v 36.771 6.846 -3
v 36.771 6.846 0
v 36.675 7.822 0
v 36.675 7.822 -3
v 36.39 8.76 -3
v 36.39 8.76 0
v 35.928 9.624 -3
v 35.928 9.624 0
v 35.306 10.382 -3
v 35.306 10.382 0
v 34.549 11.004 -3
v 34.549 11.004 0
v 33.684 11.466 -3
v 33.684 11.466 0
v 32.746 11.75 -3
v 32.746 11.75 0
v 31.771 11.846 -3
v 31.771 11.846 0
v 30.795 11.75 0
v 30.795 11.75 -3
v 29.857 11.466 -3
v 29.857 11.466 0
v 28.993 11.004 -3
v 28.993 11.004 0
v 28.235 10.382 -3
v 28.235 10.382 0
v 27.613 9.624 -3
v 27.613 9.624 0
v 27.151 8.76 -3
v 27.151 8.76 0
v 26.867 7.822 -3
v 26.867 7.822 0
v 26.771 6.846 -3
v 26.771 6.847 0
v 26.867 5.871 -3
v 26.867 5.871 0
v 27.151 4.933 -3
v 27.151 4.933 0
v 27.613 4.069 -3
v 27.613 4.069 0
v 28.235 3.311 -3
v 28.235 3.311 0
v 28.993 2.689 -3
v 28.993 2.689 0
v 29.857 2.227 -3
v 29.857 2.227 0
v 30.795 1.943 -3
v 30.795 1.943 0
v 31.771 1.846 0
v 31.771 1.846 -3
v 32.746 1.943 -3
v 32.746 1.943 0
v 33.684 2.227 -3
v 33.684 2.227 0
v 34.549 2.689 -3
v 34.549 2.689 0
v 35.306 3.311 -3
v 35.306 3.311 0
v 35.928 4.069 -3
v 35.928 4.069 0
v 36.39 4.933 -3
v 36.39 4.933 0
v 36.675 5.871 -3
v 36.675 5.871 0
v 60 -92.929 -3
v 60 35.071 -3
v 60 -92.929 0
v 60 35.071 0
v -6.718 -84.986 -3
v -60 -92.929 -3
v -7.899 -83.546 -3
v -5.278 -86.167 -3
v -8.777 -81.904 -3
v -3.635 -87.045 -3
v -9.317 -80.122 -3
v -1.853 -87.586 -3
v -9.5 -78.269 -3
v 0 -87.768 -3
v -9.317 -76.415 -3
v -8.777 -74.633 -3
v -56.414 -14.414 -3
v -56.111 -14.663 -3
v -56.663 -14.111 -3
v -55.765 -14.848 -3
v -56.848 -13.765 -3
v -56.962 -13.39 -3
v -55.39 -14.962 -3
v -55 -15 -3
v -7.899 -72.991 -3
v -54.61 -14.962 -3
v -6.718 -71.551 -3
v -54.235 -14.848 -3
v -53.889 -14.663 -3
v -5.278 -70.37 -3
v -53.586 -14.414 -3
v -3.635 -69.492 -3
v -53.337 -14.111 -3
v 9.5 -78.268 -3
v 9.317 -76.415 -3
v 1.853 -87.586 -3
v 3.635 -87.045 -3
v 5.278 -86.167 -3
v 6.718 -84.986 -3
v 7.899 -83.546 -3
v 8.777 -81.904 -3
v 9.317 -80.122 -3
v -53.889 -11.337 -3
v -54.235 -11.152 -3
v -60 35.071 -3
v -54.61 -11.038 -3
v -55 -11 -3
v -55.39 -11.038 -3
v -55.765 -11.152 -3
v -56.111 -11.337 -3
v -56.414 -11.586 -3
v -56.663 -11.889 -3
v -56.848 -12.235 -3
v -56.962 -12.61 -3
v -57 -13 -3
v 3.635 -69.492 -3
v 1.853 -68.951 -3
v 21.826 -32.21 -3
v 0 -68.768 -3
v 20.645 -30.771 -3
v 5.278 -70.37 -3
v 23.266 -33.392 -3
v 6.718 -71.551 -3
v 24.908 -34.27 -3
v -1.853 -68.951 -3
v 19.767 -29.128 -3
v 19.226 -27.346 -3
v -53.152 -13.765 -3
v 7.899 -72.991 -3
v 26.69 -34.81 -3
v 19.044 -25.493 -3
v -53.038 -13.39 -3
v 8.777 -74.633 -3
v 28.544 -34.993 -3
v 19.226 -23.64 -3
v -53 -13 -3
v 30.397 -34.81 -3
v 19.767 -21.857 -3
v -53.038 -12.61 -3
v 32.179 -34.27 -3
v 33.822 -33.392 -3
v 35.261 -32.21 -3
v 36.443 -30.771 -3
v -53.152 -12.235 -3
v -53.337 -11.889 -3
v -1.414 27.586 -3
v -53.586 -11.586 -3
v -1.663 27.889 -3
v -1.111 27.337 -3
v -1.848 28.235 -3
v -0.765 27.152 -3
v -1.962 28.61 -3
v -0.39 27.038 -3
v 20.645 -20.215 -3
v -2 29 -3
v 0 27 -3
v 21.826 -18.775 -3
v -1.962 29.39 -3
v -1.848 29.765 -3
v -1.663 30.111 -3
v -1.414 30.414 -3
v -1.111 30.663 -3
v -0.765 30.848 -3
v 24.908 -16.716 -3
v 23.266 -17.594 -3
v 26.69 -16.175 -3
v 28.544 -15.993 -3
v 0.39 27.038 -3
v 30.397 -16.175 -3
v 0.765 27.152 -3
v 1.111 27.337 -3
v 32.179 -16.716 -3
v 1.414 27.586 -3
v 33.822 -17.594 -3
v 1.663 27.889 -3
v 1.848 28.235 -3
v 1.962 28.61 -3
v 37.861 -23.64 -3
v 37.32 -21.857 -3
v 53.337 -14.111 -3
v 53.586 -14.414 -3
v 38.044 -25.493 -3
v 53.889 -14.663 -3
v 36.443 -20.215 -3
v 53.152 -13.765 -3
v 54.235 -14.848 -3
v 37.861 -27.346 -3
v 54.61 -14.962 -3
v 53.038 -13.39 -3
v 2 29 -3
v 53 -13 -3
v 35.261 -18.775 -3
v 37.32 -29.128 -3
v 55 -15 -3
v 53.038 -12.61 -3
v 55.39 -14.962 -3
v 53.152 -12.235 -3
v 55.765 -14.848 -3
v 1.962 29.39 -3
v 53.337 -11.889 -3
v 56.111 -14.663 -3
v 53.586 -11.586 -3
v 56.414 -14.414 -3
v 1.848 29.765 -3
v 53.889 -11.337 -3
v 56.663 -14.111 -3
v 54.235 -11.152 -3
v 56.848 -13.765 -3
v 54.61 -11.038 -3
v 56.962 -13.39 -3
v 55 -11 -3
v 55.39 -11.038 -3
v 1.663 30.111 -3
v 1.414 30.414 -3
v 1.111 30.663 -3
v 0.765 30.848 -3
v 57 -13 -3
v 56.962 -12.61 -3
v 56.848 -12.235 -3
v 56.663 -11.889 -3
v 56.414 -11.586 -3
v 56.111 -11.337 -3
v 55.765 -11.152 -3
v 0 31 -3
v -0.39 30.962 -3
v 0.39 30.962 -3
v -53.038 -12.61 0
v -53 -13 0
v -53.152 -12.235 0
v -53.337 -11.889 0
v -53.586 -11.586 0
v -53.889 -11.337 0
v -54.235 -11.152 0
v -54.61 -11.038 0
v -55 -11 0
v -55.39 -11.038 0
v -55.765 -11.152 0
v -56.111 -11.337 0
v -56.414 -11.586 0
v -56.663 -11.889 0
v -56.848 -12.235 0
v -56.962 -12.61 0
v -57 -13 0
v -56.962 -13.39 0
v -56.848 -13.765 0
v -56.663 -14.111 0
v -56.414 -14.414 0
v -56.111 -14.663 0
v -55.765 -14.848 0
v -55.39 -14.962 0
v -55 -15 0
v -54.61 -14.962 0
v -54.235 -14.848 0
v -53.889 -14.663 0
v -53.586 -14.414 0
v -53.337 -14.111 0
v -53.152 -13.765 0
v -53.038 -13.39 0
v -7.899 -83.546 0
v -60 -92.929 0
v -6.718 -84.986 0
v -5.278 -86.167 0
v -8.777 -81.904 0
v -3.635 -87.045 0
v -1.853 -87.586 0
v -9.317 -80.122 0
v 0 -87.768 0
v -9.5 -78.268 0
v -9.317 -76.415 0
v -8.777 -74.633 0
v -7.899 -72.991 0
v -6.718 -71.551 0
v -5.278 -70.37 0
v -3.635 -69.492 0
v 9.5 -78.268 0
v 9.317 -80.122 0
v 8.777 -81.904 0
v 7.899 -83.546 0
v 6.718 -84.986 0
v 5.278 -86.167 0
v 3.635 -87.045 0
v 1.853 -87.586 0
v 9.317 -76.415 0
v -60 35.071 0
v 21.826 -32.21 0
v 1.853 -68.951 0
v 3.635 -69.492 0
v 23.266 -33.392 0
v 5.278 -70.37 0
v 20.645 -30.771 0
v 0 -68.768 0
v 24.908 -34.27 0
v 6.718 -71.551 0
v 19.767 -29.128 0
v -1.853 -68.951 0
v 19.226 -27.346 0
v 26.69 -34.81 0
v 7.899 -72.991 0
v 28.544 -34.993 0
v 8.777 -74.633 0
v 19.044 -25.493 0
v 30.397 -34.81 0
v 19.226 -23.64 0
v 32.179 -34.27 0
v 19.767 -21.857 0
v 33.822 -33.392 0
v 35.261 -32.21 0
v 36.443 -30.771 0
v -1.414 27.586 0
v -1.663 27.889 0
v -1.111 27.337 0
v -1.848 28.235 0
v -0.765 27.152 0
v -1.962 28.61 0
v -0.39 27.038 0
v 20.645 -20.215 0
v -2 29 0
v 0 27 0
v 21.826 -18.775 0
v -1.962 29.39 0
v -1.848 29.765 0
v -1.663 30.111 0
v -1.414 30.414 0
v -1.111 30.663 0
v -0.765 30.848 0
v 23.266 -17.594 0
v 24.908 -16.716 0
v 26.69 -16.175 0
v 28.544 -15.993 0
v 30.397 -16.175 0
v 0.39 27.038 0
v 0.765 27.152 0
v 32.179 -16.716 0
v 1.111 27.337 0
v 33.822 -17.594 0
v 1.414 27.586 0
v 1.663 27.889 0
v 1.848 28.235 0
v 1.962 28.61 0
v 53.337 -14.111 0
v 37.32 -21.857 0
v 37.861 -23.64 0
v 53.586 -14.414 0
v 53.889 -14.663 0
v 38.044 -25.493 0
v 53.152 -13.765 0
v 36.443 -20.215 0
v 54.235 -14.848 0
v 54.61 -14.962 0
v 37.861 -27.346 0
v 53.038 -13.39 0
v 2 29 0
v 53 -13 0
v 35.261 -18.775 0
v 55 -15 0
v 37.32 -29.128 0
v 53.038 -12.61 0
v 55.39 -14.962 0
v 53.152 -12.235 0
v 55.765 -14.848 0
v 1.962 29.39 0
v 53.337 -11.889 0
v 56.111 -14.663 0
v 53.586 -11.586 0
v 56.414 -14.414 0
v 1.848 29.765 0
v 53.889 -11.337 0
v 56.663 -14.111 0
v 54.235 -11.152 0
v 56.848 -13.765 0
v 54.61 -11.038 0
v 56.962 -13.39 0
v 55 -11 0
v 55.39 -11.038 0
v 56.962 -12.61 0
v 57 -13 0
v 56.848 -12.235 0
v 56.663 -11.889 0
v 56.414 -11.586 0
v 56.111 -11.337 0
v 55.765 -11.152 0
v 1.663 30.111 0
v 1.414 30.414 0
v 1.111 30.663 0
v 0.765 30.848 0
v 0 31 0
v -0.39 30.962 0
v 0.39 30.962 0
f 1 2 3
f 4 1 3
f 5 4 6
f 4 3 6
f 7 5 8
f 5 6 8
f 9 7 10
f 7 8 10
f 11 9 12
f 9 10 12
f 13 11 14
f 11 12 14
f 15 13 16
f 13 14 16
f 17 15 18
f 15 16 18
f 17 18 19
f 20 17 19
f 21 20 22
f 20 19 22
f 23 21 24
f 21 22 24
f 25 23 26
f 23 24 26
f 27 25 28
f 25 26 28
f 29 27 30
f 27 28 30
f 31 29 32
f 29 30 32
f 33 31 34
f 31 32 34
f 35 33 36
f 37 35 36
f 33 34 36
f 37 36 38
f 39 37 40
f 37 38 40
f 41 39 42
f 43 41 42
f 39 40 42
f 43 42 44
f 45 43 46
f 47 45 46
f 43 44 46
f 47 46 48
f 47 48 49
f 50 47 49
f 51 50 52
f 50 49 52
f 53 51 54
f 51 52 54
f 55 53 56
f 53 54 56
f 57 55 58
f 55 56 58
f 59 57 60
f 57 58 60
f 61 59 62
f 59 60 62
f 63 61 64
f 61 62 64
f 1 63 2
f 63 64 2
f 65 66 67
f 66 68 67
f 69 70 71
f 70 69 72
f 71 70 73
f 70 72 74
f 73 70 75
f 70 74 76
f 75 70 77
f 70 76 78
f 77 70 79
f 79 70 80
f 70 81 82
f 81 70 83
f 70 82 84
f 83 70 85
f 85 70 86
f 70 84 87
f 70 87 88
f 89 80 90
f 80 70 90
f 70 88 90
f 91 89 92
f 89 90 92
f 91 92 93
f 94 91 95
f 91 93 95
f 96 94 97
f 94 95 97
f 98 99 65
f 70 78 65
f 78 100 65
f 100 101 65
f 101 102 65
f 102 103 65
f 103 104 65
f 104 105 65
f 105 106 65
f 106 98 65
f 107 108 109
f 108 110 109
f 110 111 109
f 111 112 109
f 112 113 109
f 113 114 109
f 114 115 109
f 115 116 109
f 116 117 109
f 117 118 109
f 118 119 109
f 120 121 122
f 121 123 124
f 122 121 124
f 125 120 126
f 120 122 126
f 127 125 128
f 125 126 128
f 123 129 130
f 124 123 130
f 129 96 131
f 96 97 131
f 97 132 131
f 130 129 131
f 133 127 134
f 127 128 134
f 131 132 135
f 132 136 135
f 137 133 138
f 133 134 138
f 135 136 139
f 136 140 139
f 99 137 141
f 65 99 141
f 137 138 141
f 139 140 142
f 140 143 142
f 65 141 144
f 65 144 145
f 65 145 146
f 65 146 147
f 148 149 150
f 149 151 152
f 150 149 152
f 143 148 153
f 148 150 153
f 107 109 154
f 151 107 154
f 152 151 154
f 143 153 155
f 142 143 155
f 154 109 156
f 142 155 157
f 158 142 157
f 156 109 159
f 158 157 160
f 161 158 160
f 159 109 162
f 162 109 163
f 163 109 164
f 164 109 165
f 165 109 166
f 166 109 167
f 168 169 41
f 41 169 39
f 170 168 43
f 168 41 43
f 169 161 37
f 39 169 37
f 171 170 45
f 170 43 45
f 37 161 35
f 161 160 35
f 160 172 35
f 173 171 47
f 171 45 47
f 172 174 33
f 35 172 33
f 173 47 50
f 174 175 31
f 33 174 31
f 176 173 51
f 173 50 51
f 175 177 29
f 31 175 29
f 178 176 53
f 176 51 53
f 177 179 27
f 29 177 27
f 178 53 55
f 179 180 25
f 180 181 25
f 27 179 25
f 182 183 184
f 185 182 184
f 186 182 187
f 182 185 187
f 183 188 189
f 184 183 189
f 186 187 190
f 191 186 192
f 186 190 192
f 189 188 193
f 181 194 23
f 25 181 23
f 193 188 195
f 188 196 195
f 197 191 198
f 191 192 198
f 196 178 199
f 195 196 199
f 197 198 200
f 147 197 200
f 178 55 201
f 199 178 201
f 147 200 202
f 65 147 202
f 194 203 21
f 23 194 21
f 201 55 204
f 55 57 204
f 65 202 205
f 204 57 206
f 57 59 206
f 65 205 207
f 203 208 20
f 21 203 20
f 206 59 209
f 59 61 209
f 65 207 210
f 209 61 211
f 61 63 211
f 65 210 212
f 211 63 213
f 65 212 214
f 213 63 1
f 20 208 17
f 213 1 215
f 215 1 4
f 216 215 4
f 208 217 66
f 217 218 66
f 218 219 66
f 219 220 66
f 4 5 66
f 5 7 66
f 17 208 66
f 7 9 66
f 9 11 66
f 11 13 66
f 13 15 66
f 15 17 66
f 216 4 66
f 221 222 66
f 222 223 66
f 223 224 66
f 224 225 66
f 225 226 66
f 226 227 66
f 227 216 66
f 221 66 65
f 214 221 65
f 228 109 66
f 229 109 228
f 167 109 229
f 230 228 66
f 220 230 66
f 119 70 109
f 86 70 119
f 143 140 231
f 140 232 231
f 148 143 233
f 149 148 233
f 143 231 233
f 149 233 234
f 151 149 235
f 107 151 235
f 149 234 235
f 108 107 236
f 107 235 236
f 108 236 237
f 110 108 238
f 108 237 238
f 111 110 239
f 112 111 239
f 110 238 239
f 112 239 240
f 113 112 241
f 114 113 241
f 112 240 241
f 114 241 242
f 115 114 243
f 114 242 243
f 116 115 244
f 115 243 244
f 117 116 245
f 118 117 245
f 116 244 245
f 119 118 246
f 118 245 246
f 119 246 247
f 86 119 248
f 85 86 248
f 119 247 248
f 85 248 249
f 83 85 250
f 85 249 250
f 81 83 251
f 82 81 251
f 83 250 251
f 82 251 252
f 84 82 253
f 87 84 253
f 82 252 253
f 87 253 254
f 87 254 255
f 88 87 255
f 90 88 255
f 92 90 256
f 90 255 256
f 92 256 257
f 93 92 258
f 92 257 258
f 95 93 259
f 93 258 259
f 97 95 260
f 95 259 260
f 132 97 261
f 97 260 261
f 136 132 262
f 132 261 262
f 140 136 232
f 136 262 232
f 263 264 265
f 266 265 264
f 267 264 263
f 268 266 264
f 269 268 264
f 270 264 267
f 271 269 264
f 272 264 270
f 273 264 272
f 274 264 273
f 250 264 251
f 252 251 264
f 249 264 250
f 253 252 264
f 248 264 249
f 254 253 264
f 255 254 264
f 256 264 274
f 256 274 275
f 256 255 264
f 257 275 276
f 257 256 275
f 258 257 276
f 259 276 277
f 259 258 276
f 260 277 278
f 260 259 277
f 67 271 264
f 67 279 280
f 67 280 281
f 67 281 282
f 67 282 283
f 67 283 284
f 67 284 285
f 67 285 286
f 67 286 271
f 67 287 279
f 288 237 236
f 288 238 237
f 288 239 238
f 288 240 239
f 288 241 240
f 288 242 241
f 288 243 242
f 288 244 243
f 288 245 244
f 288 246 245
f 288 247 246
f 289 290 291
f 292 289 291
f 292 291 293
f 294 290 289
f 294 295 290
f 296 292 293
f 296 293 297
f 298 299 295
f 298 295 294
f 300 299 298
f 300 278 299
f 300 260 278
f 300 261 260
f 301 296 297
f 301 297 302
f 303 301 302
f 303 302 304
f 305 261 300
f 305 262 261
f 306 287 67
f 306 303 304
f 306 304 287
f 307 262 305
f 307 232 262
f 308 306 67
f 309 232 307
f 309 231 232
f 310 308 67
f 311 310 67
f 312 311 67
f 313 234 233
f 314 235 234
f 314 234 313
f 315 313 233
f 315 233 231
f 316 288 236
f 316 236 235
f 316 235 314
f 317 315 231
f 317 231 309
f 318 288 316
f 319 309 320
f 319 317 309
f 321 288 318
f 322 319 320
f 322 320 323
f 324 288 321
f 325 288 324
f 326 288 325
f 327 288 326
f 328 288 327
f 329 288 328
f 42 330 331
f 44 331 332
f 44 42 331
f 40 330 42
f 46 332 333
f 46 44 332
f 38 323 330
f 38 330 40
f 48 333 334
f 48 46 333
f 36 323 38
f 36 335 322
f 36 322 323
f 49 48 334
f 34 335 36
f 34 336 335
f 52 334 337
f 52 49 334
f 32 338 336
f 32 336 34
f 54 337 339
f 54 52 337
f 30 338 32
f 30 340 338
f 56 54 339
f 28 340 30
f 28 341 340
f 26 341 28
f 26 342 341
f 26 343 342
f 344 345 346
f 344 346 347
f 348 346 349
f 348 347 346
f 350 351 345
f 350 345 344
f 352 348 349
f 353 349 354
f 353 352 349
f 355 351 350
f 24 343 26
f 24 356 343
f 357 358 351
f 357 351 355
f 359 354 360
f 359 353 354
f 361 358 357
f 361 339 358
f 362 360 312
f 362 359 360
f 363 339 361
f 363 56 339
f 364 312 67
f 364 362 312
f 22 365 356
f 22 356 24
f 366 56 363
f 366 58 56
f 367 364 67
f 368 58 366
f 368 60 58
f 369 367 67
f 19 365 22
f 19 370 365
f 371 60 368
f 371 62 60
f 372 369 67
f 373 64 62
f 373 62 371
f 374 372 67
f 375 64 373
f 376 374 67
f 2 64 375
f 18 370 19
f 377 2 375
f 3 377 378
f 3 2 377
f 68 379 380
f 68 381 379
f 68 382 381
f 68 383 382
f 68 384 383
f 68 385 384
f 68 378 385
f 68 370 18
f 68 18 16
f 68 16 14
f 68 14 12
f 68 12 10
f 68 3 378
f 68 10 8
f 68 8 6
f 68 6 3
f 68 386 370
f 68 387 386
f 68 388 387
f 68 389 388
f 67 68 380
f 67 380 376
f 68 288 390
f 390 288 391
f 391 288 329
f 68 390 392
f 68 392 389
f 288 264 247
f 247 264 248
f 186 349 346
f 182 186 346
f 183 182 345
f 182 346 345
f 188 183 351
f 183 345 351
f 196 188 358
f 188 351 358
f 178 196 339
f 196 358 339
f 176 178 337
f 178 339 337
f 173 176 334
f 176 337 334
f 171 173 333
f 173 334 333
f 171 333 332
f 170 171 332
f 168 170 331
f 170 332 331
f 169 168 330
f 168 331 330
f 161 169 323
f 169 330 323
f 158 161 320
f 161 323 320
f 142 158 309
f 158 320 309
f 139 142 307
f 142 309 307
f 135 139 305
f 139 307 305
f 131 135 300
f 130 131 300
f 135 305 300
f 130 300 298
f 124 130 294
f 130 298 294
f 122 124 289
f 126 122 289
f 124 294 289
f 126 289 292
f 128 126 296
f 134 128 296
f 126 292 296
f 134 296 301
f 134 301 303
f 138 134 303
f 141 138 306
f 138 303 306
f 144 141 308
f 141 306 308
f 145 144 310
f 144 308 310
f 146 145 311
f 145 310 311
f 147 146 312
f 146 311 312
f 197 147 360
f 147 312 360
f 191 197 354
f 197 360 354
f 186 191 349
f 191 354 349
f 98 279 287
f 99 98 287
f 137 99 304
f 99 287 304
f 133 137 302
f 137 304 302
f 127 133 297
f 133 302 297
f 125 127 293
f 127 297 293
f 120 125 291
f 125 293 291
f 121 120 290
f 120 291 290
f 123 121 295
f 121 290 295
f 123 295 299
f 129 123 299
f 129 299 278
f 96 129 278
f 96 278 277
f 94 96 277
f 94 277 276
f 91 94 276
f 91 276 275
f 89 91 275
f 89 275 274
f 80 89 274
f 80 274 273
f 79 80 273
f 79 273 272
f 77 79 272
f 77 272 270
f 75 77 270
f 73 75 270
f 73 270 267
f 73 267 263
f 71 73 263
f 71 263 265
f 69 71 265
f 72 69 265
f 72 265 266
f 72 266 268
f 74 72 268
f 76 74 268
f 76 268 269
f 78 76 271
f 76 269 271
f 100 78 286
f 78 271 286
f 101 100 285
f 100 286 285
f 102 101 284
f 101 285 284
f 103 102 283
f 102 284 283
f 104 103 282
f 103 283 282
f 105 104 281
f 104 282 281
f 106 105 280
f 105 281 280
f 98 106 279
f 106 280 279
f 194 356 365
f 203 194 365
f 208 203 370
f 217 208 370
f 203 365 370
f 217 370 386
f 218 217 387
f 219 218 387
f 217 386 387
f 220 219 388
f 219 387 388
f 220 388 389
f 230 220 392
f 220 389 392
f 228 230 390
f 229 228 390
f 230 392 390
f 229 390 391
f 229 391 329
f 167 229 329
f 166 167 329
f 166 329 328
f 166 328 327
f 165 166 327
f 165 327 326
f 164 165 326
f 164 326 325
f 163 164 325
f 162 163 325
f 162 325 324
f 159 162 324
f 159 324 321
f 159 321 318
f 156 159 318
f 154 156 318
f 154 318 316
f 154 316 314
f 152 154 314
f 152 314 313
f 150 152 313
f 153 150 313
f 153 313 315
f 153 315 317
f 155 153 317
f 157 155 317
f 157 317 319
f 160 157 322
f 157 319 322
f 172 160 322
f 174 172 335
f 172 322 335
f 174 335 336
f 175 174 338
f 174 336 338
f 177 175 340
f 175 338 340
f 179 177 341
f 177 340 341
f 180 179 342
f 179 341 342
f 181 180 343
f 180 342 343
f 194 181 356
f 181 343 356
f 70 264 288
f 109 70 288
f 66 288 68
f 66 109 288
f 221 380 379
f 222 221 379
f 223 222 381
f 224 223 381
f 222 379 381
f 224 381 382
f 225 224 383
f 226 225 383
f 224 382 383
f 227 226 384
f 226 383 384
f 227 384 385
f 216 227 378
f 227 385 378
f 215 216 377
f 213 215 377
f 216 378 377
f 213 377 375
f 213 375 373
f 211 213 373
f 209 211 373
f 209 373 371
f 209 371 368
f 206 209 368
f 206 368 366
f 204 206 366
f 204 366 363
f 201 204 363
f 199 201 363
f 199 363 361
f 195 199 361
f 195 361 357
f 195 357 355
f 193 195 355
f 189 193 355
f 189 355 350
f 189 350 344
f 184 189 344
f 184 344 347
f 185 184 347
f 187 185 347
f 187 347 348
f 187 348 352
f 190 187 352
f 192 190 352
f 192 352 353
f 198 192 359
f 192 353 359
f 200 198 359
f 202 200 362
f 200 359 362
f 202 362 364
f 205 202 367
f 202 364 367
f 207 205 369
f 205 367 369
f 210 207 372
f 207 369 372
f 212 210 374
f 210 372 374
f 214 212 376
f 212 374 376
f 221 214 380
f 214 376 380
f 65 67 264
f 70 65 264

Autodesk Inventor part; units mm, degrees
ref_plane "YZ Plane" through (0, 0, 0) normal (1, 0, 0) x (0, 1, 0)
ref_plane "XZ Plane" through (0, 0, 0) normal (0, 1, 0) x (-1, 0, 0)
ref_plane "XY Plane" through (0, 0, 0) normal (0, 0, 1) x (1, 0, 0)
sketch "スケッチ3" plane through (0, 0, 0) normal (0, 0, 1) x (1, 0, 0)
  line L0 (60, -99.3436) -> (-60, -99.3436)
  line L1 (-60, -99.3436) -> (-60, 99.3436)
  line L2 (-60, 99.3436) -> (60, 99.3436)
  line L3 (60, 99.3436) -> (60, -99.3436)
  line L4 (60, -99.3436) -> (-60, 99.3436) construction
  line L5 (-60, -99.3436) -> (60, 99.3436) construction
  point P0 (0, 0)
  dimension "d25" = 120
extrude "押し出し1" add sketch "スケッチ3" against normal blind 3
sketch "スケッチ4" plane through (0, 0, 0) normal (0, 0, 1) x (1, 0, 0)
  line L0 (0, 45.0711) -> (68.3595, 45.0711)
  line L1 (68.3595, 45.0711) -> (-74.3824, 45.0711)
  line L2 (-74.3824, 45.0711) -> (108.1656, 45.0711)
  line L3 (108.1656, 45.0711) -> (108.1656, 129.4154)
  line L4 (108.1656, 129.4154) -> (-74.3824, 129.4154)
  line L5 (-74.3824, 129.4154) -> (-74.3824, 45.0711)
  point P0 (0, 0)
extrude "押し出し4" cut sketch "スケッチ4" against normal blind 10
sketch "スケッチ13" plane through (0, 0, 0) normal (0, 0, 1) x (1, 0, 0)
  circle A0 centre (0, 0) radius 7.5
  circle A1 centre (0, 0) radius 32.5
  circle A2 centre (31.7707, 6.8465) radius 25
  circle A3 centre (31.7707, 6.8465) radius 7.5
  circle A4 centre (31.7707, 6.8465) radius 32.5
  circle A5 centre (28.5436, -25.4929) radius 25
  circle A6 centre (28.5436, -25.4929) radius 20
  circle A7 centre (28.5436, -25.4929) radius 60
  circle A8 centre (0, -78.2685) radius 40
  circle A9 centre (0, -78.2685) radius 50
  circle A10 centre (31.7707, 6.8465) radius 5
  circle A11 centre (28.5436, -25.4929) radius 9.5
  circle A12 centre (0, -78.2685) radius 9.5
  dimension "d87" = 65
  dimension "d89" = 65
  dimension "d91" = 120
  dimension "d86" = 15
  dimension "d88" = 15
  dimension "d90" = 40
  dimension "d92" = 100
  dimension "d96" = 10
  dimension "d97" = 19
  dimension "d98" = 19
extrude "押し出し16" cut sketch "スケッチ13" against normal blind 10 contours A10 A1 | A1 A10 | A11 A1 A2 | A2 A1 A4 A11 | A4 A1 A11 | A2 A11 A4 A1 | A1 A11 A2 | A4 A11 A1 | A12 A7 | A7 A12
sketch "スケッチ14" plane through (0, 0, 0) normal (0, 0, 1) x (1, 0, 0)
  point P0 (0, 0)
sketch "スケッチ15" plane through (0, 0, 0) normal (0, 0, 1) x (1, 0, 0)
  line L0 (-60, -99.3436) -> (-60, 45.0711) projected
  line L1 (60, 45.0711) -> (60, -99.3436) projected
  line L2 (-60, 45.0711) -> (60, 45.0711)
  line L3 (60, 45.0711) -> (60, -92.9289)
  line L4 (60, -92.9289) -> (-60, -92.9289)
  line L5 (-60, -92.9289) -> (-60, 45.0711)
  point P0 (0, 0)
  dimension "d101" = 138
extrude "押し出し17" cut sketch "スケッチ15" against normal blind 10 keep common part
sketch "スケッチ16" plane through (-60, 45.0711, 0) normal (0, 1, 0) x (1, 0, 0)
  line L0 (-11.4218, 21.1899) -> (145.405, 21.1899)
  line L1 (145.405, 21.1899) -> (145.405, -40.3361)
  line L2 (145.405, -40.3361) -> (-11.4218, -40.3361)
  line L3 (-11.4218, -40.3361) -> (-11.4218, 21.1899)
  point P0 (60, 0)
extrude "押し出し18" cut sketch "スケッチ16" against normal blind 10
sketch "スケッチ17" plane through (0, 0, 0) normal (0, 0, 1) x (1, 0, 0)
  circle A0 centre (31.7707, 6.8465) radius 5
  circle A1 centre (31.7707, 6.8465) radius 25
  circle A2 centre (28.5436, -25.4929) radius 9.5
  circle A3 centre (28.5436, -25.4929) radius 25
  circle A4 centre (55, -13) radius 2
  circle A5 centre (-55, -13) radius 2
  circle A6 centre (0, 29) radius 2
  point P0 (0, 0)
  point P1 (0, 0)
  dimension "d106" = 50
  dimension "d107" = 50
  dimension "d108" = 4
  dimension "d109" = 4
  dimension "d110" = 4
extrude "押し出し19" cut sketch "スケッチ17" against normal blind 10 contours A4 | A5 | A6
properties part number "板2" material "アルミニウム 6061"
